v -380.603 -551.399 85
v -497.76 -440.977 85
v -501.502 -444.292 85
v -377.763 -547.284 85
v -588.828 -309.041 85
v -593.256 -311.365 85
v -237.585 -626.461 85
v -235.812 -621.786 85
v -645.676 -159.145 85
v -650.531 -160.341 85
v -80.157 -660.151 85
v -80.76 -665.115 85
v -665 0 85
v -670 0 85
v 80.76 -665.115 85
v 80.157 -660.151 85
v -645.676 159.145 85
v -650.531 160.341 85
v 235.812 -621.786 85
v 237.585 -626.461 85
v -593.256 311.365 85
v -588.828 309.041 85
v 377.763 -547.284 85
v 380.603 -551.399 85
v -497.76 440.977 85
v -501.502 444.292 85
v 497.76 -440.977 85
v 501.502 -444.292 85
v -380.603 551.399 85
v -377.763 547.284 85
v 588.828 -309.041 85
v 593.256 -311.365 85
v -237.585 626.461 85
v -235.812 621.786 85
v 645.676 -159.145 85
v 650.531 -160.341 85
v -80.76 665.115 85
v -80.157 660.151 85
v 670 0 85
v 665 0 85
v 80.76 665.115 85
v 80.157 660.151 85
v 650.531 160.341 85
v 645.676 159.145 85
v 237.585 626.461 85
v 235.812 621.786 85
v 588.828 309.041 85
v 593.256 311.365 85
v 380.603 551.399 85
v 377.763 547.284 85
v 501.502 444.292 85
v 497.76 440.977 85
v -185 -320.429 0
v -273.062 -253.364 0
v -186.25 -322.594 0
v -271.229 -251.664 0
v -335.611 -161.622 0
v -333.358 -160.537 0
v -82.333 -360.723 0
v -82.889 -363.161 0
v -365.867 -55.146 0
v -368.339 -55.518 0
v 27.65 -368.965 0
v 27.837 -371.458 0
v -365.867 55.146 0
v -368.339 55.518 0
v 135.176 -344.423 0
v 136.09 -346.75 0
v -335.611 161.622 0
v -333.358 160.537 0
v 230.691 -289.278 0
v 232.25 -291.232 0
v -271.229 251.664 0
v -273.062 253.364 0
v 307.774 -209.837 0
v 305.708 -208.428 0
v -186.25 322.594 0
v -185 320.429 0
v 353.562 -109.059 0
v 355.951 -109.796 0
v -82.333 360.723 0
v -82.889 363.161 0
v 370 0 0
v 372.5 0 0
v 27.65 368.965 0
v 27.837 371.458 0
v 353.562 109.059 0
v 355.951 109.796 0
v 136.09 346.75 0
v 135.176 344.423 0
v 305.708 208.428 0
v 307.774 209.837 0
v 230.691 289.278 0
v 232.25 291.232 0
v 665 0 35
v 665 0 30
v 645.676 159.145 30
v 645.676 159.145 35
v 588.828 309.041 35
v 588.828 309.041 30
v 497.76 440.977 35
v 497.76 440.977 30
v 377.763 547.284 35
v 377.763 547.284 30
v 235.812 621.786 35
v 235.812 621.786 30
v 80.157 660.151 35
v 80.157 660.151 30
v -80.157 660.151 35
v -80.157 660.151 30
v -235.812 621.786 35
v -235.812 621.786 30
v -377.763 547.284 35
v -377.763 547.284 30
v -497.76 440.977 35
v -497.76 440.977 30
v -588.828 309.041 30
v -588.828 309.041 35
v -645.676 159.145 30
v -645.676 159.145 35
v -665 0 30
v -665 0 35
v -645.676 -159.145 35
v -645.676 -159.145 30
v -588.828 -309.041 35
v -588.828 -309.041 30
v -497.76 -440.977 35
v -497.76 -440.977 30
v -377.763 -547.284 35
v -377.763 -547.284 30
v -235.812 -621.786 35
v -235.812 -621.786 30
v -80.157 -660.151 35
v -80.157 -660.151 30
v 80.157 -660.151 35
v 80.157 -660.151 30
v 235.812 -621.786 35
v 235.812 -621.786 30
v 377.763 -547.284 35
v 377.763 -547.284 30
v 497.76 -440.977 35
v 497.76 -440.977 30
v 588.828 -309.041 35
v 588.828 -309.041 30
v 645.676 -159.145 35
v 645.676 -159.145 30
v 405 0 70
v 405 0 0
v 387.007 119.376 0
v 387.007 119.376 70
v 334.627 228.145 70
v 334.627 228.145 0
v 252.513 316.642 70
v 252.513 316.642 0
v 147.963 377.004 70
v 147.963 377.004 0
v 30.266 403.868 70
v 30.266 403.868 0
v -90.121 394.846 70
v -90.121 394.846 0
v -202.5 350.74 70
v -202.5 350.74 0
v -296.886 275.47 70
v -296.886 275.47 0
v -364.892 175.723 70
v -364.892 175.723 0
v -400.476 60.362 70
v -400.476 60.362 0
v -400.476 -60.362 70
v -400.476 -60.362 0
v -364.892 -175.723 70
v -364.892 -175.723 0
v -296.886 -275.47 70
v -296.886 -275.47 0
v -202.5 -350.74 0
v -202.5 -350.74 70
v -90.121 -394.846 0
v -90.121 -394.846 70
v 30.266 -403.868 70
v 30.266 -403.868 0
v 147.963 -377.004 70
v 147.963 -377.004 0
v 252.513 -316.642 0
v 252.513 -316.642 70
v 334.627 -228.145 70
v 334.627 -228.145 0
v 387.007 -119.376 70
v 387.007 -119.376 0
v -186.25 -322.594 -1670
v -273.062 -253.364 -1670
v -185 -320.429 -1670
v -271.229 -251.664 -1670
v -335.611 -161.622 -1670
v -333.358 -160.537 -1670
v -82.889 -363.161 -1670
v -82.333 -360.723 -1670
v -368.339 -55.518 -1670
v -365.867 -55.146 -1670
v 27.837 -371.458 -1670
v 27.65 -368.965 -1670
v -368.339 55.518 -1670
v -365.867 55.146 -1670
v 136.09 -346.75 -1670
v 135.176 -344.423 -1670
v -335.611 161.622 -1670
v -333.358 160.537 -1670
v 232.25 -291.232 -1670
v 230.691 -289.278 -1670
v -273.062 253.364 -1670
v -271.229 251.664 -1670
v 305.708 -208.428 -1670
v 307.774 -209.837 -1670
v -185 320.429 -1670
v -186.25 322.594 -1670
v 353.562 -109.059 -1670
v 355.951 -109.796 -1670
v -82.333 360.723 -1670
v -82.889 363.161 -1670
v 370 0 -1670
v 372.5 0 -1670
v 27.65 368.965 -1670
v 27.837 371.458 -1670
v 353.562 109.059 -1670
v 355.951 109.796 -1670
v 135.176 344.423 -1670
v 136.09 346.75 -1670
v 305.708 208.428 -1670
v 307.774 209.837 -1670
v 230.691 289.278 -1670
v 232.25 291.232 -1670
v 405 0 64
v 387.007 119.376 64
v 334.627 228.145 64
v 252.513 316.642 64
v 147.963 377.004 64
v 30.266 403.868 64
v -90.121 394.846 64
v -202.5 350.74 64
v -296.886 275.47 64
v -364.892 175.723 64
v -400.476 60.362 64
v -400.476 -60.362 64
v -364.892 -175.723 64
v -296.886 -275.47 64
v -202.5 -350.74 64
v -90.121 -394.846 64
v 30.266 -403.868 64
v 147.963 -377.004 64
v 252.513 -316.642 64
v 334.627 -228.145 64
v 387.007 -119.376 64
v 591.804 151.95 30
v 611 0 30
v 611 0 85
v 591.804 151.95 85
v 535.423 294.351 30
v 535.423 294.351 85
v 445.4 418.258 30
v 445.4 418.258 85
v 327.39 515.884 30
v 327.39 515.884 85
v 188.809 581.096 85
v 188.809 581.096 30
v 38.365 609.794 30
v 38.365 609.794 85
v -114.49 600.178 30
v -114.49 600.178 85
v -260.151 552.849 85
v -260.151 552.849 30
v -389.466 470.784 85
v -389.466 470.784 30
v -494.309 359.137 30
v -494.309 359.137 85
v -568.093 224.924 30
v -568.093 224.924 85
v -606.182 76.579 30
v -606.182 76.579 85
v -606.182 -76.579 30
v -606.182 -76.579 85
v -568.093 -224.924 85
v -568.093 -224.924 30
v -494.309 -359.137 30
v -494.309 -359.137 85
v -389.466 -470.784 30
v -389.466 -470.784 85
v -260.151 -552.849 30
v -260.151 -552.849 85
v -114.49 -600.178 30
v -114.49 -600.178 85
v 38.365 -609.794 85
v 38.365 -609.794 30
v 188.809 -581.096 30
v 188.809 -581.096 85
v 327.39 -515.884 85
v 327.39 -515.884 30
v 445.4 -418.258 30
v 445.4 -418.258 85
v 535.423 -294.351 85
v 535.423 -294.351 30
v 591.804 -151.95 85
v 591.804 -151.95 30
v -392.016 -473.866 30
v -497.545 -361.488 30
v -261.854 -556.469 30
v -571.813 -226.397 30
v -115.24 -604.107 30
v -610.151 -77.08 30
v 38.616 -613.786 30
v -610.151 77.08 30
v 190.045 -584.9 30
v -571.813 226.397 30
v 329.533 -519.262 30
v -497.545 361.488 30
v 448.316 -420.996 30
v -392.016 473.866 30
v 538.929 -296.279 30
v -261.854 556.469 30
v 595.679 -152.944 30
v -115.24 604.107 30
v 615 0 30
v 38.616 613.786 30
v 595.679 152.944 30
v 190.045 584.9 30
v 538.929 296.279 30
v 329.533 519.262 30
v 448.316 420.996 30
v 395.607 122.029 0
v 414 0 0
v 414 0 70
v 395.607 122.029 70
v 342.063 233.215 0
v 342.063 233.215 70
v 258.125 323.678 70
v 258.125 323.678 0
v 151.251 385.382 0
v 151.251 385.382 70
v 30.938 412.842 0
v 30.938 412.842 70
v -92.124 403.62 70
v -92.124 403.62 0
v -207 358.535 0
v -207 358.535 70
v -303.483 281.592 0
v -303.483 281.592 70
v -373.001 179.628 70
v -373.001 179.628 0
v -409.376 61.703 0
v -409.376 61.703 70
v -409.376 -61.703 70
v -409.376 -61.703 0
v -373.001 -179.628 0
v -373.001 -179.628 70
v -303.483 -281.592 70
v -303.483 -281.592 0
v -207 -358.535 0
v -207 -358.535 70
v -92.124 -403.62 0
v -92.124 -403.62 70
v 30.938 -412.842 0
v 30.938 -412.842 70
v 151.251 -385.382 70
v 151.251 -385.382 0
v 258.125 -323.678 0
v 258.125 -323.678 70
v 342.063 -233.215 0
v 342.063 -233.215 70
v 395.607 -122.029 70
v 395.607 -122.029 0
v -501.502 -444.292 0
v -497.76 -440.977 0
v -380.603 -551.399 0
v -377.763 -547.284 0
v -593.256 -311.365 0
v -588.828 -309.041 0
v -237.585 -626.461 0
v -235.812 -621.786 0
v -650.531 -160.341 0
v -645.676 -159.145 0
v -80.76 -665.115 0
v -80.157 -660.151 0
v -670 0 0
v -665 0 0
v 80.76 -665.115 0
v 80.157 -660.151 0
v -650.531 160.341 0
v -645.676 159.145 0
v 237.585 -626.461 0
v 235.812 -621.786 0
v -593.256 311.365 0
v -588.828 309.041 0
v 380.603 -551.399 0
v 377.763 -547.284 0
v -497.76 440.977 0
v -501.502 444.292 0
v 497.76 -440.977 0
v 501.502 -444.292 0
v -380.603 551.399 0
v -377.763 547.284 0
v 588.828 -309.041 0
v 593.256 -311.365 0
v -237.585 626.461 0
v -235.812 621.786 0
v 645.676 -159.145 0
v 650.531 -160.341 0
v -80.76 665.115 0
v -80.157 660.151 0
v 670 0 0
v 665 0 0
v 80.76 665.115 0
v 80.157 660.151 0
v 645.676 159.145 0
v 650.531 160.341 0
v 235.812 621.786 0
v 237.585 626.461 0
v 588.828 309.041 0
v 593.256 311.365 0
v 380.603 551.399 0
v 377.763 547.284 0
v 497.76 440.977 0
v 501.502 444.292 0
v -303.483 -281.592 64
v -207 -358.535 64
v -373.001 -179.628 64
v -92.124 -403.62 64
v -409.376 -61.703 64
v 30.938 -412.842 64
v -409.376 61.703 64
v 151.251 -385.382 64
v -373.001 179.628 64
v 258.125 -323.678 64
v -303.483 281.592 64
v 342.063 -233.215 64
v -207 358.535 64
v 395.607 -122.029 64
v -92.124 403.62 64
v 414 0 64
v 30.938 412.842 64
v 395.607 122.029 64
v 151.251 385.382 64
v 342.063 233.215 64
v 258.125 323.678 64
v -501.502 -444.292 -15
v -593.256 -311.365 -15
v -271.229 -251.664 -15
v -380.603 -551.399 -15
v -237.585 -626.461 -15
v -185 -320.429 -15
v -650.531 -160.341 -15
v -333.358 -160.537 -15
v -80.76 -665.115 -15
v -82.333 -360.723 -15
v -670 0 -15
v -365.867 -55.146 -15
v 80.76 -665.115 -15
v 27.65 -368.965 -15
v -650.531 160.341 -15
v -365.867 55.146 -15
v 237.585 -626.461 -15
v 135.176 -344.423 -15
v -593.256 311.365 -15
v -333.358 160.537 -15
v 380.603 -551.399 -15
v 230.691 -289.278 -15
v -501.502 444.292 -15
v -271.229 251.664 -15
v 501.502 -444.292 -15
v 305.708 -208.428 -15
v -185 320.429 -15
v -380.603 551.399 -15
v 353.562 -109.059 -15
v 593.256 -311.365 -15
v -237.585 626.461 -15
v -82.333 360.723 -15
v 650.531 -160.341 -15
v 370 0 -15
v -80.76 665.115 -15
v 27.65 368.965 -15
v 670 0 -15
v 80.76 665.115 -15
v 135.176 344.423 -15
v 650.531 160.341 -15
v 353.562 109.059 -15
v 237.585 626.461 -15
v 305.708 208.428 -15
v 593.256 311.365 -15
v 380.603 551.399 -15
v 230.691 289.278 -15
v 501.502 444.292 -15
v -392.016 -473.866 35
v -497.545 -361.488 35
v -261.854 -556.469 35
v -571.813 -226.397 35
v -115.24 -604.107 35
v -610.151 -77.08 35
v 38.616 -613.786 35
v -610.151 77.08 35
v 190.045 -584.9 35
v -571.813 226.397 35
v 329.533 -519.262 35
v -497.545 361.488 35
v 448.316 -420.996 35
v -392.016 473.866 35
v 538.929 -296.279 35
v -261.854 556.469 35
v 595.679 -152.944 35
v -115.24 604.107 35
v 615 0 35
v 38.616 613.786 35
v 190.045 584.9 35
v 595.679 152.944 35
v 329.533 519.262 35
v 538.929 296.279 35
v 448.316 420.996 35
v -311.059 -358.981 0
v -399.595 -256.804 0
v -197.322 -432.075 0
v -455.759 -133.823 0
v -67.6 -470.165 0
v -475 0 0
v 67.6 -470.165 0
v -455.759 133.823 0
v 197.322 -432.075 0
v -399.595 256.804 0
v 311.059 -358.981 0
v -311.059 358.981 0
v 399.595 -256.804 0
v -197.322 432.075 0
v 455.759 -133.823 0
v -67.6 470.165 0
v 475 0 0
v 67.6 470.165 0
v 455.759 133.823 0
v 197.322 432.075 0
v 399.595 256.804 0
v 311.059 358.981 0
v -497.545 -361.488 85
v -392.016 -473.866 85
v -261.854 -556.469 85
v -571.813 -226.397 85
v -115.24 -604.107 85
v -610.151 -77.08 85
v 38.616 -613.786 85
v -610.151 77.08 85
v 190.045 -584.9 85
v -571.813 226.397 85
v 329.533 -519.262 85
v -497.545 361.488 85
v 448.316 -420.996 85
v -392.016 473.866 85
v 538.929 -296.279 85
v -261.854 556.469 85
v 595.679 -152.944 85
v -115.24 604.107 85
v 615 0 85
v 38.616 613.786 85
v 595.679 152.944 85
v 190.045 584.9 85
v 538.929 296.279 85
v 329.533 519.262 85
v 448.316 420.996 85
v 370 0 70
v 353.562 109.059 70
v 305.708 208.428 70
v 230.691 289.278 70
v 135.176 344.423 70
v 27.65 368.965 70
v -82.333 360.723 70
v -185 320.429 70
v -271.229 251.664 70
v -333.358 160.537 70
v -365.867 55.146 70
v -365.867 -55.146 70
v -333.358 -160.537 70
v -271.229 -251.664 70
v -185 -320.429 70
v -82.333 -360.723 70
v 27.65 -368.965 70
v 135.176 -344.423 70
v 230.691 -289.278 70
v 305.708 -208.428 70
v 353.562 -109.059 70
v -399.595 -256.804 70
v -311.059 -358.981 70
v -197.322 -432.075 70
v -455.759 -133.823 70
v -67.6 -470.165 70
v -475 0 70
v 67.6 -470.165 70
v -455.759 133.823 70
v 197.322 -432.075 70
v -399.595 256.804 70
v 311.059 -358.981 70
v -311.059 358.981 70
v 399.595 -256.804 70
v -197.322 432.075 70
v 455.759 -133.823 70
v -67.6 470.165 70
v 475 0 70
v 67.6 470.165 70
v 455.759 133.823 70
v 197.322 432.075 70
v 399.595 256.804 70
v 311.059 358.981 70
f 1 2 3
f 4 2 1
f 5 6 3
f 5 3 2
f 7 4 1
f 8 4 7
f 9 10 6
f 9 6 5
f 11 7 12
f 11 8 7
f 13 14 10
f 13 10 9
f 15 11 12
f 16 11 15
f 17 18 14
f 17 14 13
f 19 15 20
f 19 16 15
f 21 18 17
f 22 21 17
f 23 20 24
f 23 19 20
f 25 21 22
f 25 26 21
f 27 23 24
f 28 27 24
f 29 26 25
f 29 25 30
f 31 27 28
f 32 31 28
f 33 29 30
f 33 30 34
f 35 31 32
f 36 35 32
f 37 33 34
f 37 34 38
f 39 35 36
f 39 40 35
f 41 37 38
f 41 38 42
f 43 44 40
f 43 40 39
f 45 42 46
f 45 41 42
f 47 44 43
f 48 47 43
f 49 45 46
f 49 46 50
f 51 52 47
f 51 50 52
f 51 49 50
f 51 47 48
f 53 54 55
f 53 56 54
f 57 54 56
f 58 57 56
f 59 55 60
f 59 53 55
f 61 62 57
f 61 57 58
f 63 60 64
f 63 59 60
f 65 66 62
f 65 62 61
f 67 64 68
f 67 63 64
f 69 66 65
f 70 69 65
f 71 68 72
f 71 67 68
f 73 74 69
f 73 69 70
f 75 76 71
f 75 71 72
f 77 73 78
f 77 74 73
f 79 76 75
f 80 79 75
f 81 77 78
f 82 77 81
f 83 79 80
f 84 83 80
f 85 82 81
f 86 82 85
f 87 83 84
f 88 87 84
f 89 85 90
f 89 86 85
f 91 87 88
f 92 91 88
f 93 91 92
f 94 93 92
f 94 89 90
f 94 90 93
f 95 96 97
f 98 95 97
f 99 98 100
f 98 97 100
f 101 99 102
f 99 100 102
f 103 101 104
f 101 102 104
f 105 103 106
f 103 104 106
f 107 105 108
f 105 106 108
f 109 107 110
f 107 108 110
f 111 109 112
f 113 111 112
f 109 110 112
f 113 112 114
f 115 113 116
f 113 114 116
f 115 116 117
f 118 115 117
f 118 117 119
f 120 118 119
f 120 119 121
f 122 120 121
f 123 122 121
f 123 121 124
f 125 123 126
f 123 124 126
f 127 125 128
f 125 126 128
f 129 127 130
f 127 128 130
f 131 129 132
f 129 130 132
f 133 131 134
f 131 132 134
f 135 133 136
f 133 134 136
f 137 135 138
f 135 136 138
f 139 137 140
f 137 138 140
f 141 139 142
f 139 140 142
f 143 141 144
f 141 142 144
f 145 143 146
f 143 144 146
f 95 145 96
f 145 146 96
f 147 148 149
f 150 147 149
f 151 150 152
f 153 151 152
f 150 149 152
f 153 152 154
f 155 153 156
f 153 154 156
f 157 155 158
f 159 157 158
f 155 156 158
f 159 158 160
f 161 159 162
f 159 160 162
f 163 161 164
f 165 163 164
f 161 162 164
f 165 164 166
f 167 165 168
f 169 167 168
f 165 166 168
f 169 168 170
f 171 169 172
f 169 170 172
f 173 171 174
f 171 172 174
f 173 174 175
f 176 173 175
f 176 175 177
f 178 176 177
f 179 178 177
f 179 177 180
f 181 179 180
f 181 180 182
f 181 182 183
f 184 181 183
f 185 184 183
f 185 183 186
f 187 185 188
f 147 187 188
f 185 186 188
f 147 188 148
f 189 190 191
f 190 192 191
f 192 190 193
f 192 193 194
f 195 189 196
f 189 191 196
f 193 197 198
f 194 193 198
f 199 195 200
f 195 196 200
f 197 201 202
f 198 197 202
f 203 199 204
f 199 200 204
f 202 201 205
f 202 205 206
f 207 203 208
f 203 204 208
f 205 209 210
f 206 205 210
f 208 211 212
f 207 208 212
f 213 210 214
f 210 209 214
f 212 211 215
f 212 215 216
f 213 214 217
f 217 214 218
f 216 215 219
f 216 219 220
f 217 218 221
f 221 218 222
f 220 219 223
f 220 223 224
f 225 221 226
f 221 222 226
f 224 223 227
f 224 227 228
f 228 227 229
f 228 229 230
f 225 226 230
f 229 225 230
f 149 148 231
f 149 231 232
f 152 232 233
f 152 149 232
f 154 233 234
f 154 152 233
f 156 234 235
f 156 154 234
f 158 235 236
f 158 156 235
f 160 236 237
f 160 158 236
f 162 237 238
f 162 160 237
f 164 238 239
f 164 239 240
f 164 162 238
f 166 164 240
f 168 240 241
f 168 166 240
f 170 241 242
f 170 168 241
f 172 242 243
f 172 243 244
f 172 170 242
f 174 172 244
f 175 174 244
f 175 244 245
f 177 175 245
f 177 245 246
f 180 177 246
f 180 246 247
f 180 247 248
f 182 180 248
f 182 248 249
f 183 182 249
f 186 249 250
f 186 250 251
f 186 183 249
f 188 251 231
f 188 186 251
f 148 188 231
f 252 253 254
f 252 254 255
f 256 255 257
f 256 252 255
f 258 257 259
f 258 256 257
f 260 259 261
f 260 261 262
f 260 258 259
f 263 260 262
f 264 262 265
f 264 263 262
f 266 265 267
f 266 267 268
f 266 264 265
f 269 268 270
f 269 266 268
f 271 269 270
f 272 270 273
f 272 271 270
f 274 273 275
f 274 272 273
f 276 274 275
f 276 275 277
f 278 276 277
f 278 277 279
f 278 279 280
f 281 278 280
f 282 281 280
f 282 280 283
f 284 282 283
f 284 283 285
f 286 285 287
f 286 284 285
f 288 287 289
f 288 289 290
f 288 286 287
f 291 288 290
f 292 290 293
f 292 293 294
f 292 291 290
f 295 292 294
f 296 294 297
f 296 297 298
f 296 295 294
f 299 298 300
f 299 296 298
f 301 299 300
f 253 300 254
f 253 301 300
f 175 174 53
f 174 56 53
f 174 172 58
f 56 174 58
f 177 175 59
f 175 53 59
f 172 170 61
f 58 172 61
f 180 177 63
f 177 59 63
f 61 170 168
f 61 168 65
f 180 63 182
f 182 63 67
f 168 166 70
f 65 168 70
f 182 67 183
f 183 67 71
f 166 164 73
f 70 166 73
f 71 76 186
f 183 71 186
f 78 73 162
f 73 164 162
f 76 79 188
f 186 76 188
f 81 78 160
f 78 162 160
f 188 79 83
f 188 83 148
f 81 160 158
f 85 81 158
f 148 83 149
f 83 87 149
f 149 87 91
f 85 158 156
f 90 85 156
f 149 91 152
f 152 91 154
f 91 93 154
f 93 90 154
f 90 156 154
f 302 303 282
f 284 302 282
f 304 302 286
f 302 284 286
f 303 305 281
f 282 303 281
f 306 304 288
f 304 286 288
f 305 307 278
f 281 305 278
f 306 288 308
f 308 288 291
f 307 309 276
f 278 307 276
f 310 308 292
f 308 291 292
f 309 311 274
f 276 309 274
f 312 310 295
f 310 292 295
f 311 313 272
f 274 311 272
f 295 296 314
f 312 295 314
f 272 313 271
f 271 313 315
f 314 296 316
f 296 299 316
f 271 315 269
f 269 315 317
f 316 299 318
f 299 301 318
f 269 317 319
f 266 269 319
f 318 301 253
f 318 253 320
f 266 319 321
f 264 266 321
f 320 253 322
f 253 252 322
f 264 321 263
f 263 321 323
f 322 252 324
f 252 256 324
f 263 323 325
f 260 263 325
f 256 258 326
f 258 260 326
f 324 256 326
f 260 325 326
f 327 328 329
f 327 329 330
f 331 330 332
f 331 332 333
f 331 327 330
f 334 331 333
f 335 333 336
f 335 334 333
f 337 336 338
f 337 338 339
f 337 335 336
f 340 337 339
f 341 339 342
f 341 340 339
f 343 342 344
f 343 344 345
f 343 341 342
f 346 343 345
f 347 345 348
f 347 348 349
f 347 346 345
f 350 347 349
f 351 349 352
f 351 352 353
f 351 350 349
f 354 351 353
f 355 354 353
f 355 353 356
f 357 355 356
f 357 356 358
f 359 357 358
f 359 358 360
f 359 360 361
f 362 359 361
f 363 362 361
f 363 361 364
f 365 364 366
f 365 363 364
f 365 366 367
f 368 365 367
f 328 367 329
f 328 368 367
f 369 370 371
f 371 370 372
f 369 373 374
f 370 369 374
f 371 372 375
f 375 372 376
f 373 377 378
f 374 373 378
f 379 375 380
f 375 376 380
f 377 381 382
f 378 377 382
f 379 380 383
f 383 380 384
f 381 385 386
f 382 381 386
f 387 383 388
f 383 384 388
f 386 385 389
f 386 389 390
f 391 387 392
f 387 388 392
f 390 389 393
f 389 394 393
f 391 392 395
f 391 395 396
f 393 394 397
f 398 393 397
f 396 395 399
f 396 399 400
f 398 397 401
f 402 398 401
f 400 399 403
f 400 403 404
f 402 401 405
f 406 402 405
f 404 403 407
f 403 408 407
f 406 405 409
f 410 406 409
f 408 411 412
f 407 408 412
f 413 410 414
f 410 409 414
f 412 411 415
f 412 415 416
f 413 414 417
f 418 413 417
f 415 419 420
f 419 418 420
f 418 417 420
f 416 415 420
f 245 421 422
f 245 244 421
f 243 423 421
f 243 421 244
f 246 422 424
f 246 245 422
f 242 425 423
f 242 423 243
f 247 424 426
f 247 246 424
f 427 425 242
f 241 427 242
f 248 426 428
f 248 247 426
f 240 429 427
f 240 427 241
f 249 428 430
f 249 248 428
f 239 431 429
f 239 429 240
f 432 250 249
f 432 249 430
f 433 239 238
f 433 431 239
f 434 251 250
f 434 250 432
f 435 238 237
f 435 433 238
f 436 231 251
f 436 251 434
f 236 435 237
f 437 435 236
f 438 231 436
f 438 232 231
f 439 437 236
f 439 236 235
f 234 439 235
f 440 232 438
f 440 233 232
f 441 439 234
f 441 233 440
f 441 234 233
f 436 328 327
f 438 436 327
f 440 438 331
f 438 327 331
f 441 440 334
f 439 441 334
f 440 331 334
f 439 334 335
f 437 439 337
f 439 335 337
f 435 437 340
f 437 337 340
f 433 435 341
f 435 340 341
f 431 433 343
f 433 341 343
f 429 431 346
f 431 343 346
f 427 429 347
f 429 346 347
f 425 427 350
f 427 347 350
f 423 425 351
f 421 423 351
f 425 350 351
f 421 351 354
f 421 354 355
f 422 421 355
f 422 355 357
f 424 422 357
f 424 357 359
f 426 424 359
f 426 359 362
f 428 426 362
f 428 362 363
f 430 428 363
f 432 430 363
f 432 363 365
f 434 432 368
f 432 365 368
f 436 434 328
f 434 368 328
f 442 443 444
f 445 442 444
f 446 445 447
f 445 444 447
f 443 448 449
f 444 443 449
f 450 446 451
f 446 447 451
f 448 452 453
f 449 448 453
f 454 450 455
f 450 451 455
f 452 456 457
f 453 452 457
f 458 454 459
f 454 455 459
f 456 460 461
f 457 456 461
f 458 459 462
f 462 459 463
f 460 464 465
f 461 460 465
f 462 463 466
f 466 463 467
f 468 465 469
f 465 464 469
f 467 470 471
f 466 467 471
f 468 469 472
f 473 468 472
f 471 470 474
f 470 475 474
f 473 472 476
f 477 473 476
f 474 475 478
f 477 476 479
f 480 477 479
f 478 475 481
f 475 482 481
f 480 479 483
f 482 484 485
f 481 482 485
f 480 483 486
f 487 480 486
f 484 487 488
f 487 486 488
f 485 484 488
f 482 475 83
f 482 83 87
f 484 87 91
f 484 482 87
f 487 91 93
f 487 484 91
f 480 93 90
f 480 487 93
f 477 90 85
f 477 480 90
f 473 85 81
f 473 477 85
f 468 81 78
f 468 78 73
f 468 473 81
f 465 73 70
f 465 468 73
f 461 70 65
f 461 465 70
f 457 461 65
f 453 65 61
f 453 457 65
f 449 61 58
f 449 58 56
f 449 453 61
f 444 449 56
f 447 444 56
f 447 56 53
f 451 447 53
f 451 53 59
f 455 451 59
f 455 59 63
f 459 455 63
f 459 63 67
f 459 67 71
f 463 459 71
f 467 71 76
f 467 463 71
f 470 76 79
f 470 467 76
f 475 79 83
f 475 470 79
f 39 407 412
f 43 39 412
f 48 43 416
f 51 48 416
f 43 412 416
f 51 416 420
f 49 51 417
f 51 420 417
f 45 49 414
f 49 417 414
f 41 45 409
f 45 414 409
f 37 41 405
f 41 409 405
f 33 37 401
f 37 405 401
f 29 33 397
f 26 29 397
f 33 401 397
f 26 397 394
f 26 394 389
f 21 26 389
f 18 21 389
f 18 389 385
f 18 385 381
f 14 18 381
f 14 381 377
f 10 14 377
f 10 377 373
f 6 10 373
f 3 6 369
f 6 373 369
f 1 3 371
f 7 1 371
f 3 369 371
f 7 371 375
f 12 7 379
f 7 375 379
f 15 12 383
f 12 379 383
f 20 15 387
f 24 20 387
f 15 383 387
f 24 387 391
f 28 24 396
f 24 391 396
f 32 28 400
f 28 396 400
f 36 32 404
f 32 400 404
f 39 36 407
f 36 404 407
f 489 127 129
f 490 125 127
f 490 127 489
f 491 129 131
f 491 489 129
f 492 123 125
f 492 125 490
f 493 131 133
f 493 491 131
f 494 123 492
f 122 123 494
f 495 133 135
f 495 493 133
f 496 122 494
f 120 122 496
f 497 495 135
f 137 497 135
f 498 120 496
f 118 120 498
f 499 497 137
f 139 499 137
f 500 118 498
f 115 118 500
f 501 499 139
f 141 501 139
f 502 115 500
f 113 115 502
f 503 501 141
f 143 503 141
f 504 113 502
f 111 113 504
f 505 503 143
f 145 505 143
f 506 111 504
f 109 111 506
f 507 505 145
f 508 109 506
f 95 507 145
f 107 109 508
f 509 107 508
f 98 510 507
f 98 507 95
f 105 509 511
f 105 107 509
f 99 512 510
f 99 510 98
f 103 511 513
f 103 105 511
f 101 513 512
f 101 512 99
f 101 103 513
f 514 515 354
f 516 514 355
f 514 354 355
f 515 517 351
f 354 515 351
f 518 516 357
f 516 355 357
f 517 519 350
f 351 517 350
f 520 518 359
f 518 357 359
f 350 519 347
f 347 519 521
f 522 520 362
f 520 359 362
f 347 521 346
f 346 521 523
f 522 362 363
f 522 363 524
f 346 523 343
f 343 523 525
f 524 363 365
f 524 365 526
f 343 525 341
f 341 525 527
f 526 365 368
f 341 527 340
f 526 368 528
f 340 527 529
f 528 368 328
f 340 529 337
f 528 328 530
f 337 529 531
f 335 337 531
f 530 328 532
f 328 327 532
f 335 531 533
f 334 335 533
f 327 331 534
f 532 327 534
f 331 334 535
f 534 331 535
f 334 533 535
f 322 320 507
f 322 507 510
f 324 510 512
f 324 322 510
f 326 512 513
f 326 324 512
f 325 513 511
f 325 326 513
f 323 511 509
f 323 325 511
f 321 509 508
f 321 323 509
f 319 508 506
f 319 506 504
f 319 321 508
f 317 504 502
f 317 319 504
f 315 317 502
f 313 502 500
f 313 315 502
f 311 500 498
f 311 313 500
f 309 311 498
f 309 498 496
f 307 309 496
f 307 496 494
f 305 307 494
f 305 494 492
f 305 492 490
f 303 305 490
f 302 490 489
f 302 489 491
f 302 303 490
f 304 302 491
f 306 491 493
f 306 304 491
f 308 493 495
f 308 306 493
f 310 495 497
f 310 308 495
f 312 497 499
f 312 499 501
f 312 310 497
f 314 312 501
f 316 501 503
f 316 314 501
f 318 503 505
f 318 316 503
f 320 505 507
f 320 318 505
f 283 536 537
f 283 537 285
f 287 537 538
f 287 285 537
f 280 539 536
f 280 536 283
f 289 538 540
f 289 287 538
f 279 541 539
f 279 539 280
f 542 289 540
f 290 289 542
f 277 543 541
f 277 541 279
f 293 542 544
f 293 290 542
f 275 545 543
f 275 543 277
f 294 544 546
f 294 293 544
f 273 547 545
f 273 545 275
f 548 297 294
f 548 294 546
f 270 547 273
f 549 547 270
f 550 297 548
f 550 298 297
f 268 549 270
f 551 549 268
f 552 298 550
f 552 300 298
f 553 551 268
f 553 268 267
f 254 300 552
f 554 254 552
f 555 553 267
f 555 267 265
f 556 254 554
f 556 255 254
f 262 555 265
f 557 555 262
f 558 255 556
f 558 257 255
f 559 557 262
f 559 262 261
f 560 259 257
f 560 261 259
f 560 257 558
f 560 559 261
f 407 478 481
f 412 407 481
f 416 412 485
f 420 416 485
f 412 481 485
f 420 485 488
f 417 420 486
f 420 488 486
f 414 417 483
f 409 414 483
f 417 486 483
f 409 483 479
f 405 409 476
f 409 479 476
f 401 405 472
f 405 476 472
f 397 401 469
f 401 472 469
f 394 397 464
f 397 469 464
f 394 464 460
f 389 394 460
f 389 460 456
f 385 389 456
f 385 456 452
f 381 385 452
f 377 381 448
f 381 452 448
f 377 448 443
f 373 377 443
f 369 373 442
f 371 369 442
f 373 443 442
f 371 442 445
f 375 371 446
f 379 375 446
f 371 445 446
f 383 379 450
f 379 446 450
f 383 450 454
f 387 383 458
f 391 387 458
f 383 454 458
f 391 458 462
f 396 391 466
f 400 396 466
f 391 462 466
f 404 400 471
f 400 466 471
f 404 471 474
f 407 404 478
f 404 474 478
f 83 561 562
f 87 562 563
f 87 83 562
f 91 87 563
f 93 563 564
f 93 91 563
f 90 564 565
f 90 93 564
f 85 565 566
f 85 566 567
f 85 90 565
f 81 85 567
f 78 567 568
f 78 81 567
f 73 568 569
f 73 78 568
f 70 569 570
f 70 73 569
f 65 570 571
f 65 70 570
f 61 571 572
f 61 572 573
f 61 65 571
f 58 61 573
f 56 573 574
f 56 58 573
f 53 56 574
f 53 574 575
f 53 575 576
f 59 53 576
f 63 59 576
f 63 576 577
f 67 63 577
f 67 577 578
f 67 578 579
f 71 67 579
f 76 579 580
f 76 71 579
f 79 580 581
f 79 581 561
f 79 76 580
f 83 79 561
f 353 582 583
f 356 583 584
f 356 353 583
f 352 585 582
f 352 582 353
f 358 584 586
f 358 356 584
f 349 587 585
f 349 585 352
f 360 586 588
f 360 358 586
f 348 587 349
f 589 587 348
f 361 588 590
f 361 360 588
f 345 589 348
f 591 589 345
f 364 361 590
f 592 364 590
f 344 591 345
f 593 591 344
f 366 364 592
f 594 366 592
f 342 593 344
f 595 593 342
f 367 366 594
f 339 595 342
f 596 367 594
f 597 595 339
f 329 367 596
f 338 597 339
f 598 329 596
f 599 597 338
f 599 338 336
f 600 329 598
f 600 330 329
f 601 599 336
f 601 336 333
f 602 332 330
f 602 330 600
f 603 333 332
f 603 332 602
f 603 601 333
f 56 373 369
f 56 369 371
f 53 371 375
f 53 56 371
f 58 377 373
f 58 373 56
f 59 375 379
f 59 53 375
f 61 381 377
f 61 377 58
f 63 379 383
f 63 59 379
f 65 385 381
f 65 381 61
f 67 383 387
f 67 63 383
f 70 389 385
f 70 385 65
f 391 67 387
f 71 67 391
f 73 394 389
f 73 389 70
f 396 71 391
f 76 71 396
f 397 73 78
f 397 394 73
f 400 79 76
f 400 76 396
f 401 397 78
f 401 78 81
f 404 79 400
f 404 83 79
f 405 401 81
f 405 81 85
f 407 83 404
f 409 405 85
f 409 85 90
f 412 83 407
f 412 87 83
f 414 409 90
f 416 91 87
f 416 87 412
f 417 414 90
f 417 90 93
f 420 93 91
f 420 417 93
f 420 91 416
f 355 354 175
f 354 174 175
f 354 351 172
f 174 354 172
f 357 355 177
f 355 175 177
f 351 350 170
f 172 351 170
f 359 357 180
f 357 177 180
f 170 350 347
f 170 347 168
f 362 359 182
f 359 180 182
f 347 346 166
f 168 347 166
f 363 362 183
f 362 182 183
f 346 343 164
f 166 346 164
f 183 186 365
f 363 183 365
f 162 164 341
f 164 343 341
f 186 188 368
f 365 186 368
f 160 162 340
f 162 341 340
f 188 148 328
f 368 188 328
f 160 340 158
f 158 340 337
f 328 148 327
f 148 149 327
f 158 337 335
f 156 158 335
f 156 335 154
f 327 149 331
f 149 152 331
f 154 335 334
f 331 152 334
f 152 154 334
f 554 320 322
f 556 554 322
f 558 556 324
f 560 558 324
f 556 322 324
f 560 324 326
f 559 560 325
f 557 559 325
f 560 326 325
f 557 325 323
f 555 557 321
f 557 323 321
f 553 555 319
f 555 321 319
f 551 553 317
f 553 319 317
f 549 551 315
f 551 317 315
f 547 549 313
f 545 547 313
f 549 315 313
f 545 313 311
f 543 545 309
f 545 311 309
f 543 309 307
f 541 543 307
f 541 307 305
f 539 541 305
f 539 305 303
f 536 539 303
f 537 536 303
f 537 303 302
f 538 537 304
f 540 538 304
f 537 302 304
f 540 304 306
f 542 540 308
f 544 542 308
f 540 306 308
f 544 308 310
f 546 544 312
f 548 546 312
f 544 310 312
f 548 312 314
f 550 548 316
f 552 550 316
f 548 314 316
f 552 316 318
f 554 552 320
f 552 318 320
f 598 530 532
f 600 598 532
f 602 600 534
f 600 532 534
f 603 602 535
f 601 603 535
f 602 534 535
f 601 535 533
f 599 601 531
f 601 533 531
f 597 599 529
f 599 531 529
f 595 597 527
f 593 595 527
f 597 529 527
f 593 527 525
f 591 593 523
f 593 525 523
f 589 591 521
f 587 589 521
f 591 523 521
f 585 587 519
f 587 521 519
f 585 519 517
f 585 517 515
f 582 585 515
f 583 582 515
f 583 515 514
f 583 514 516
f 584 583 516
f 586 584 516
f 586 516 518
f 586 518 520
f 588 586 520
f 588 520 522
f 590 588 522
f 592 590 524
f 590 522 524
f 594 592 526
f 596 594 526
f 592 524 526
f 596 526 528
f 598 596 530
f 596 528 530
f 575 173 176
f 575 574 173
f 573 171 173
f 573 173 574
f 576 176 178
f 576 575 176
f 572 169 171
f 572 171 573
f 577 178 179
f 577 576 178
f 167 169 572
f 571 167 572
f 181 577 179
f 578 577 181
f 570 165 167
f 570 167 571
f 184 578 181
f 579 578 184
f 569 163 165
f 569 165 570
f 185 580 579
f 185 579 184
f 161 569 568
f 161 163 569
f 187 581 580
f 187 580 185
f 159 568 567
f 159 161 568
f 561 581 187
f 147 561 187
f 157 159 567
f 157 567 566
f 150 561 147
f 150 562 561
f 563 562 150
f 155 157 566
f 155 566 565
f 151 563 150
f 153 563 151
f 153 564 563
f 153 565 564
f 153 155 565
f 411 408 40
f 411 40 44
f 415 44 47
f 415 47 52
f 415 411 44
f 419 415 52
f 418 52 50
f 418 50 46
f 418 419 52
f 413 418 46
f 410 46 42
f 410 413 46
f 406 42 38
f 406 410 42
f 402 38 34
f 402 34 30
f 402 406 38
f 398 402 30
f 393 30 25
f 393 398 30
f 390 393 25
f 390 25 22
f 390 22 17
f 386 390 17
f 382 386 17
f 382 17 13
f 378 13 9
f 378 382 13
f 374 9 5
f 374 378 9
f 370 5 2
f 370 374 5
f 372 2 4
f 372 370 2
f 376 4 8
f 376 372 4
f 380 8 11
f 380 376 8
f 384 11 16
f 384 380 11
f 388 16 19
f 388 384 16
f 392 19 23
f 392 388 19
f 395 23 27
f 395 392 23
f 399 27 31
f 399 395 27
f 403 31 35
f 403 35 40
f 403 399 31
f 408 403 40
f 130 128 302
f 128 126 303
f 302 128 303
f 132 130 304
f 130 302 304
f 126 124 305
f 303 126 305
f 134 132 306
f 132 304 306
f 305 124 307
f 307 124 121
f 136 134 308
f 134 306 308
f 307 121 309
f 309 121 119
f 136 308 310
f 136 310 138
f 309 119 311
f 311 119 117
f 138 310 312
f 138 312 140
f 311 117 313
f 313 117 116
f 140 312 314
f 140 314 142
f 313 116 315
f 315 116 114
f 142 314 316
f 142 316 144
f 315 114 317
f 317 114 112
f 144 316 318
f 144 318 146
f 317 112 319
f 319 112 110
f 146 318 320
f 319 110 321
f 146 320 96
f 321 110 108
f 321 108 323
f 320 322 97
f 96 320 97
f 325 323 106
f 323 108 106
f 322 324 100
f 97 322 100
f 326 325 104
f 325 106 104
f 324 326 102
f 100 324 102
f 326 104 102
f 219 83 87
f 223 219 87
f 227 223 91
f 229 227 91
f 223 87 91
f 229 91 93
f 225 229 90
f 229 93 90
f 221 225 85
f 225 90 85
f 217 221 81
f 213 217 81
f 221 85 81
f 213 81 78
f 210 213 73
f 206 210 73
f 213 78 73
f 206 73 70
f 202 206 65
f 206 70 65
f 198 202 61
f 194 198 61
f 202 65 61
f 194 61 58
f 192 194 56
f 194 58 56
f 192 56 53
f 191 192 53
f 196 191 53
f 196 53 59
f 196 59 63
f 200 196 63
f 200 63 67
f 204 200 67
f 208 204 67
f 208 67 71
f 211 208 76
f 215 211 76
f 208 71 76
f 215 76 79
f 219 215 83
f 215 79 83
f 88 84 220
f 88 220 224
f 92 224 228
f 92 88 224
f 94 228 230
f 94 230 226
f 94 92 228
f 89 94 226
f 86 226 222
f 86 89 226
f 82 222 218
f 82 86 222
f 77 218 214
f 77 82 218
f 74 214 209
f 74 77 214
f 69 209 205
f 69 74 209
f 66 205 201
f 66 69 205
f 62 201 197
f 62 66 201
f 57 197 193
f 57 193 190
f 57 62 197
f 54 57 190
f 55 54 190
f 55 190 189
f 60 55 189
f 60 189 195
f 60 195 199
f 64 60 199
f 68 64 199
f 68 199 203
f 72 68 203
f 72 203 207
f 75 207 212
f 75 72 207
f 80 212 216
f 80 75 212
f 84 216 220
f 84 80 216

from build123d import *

# Parameters (mm, degrees)
F1_R      = 405
F1_R_2    = 370
F2_DEPTH  = 70
F3_R      = 414
F3_R_2    = 405
F4_DEPTH  = 64
F5_R      = 475
F5_R_2    = 414
F6_DEPTH  = 70
F7_R      = 670
F7_R_2    = 665
F8_DEPTH  = 85
F10_R     = 615
F10_R_2   = 611
F11_DEPTH = 55
F12_R     = 665
F12_R_2   = 615
F13_DEPTH = 5
F0_R      = 372.5
F0_R_2    = 370
F14_DEPTH = 1670
F16_R     = 670
F16_R_2   = 370
F17_DEPTH = 15


with BuildPart() as f2:
    # F1 (on face) → F2 (new body)
    with BuildSketch(Plane.XY):
        Circle(F1_R)
        Circle(F1_R_2, mode=Mode.SUBTRACT)
    extrude(amount=F2_DEPTH)


with BuildPart() as f4:
    # F3 (on face) → F4 (new body)
    with BuildSketch(Plane.XY):
        Circle(F3_R)
        Circle(F3_R_2, mode=Mode.SUBTRACT)
    extrude(amount=F4_DEPTH)


with BuildPart() as f6:
    # F5 (on face) → F6 (new body)
    with BuildSketch(Plane.XY):
        Circle(F5_R)
        Circle(F5_R_2, mode=Mode.SUBTRACT)
    extrude(amount=F6_DEPTH)


with BuildPart() as f8:
    # F7 (on face) → F8 (new body)
    with BuildSketch(Plane.XY):
        Circle(F7_R)
        Circle(F7_R_2, mode=Mode.SUBTRACT)
    extrude(amount=F8_DEPTH)


with BuildPart() as f11:
    # F10 (on offset) → F11 (new body)
    with BuildSketch(Plane.XY.offset(30)):
        Circle(F10_R)
        Circle(F10_R_2, mode=Mode.SUBTRACT)
    extrude(amount=F11_DEPTH)


with BuildPart() as f13:
    # F12 (on offset) → F13 (new body)
    with BuildSketch(Plane.XY.offset(30)):
        Circle(F12_R)
        Circle(F12_R_2, mode=Mode.SUBTRACT)
    extrude(amount=F13_DEPTH)


with BuildPart() as f14:
    # F0 (on Top) → F14 (new body)
    with BuildSketch(Plane.XY):
        Circle(F0_R)
        Circle(F0_R_2, mode=Mode.SUBTRACT)
    extrude(amount=-F14_DEPTH)


with BuildPart() as f17:
    # F16 (on offset) → F17 (new body)
    with BuildSketch(Plane.XY.offset(-15)):
        Circle(F16_R)
        Circle(F16_R_2, mode=Mode.SUBTRACT)
    extrude(amount=F17_DEPTH)


solid = Compound([f2.part, f4.part, f6.part, f8.part, f11.part, f13.part, f14.part, f17.part])
